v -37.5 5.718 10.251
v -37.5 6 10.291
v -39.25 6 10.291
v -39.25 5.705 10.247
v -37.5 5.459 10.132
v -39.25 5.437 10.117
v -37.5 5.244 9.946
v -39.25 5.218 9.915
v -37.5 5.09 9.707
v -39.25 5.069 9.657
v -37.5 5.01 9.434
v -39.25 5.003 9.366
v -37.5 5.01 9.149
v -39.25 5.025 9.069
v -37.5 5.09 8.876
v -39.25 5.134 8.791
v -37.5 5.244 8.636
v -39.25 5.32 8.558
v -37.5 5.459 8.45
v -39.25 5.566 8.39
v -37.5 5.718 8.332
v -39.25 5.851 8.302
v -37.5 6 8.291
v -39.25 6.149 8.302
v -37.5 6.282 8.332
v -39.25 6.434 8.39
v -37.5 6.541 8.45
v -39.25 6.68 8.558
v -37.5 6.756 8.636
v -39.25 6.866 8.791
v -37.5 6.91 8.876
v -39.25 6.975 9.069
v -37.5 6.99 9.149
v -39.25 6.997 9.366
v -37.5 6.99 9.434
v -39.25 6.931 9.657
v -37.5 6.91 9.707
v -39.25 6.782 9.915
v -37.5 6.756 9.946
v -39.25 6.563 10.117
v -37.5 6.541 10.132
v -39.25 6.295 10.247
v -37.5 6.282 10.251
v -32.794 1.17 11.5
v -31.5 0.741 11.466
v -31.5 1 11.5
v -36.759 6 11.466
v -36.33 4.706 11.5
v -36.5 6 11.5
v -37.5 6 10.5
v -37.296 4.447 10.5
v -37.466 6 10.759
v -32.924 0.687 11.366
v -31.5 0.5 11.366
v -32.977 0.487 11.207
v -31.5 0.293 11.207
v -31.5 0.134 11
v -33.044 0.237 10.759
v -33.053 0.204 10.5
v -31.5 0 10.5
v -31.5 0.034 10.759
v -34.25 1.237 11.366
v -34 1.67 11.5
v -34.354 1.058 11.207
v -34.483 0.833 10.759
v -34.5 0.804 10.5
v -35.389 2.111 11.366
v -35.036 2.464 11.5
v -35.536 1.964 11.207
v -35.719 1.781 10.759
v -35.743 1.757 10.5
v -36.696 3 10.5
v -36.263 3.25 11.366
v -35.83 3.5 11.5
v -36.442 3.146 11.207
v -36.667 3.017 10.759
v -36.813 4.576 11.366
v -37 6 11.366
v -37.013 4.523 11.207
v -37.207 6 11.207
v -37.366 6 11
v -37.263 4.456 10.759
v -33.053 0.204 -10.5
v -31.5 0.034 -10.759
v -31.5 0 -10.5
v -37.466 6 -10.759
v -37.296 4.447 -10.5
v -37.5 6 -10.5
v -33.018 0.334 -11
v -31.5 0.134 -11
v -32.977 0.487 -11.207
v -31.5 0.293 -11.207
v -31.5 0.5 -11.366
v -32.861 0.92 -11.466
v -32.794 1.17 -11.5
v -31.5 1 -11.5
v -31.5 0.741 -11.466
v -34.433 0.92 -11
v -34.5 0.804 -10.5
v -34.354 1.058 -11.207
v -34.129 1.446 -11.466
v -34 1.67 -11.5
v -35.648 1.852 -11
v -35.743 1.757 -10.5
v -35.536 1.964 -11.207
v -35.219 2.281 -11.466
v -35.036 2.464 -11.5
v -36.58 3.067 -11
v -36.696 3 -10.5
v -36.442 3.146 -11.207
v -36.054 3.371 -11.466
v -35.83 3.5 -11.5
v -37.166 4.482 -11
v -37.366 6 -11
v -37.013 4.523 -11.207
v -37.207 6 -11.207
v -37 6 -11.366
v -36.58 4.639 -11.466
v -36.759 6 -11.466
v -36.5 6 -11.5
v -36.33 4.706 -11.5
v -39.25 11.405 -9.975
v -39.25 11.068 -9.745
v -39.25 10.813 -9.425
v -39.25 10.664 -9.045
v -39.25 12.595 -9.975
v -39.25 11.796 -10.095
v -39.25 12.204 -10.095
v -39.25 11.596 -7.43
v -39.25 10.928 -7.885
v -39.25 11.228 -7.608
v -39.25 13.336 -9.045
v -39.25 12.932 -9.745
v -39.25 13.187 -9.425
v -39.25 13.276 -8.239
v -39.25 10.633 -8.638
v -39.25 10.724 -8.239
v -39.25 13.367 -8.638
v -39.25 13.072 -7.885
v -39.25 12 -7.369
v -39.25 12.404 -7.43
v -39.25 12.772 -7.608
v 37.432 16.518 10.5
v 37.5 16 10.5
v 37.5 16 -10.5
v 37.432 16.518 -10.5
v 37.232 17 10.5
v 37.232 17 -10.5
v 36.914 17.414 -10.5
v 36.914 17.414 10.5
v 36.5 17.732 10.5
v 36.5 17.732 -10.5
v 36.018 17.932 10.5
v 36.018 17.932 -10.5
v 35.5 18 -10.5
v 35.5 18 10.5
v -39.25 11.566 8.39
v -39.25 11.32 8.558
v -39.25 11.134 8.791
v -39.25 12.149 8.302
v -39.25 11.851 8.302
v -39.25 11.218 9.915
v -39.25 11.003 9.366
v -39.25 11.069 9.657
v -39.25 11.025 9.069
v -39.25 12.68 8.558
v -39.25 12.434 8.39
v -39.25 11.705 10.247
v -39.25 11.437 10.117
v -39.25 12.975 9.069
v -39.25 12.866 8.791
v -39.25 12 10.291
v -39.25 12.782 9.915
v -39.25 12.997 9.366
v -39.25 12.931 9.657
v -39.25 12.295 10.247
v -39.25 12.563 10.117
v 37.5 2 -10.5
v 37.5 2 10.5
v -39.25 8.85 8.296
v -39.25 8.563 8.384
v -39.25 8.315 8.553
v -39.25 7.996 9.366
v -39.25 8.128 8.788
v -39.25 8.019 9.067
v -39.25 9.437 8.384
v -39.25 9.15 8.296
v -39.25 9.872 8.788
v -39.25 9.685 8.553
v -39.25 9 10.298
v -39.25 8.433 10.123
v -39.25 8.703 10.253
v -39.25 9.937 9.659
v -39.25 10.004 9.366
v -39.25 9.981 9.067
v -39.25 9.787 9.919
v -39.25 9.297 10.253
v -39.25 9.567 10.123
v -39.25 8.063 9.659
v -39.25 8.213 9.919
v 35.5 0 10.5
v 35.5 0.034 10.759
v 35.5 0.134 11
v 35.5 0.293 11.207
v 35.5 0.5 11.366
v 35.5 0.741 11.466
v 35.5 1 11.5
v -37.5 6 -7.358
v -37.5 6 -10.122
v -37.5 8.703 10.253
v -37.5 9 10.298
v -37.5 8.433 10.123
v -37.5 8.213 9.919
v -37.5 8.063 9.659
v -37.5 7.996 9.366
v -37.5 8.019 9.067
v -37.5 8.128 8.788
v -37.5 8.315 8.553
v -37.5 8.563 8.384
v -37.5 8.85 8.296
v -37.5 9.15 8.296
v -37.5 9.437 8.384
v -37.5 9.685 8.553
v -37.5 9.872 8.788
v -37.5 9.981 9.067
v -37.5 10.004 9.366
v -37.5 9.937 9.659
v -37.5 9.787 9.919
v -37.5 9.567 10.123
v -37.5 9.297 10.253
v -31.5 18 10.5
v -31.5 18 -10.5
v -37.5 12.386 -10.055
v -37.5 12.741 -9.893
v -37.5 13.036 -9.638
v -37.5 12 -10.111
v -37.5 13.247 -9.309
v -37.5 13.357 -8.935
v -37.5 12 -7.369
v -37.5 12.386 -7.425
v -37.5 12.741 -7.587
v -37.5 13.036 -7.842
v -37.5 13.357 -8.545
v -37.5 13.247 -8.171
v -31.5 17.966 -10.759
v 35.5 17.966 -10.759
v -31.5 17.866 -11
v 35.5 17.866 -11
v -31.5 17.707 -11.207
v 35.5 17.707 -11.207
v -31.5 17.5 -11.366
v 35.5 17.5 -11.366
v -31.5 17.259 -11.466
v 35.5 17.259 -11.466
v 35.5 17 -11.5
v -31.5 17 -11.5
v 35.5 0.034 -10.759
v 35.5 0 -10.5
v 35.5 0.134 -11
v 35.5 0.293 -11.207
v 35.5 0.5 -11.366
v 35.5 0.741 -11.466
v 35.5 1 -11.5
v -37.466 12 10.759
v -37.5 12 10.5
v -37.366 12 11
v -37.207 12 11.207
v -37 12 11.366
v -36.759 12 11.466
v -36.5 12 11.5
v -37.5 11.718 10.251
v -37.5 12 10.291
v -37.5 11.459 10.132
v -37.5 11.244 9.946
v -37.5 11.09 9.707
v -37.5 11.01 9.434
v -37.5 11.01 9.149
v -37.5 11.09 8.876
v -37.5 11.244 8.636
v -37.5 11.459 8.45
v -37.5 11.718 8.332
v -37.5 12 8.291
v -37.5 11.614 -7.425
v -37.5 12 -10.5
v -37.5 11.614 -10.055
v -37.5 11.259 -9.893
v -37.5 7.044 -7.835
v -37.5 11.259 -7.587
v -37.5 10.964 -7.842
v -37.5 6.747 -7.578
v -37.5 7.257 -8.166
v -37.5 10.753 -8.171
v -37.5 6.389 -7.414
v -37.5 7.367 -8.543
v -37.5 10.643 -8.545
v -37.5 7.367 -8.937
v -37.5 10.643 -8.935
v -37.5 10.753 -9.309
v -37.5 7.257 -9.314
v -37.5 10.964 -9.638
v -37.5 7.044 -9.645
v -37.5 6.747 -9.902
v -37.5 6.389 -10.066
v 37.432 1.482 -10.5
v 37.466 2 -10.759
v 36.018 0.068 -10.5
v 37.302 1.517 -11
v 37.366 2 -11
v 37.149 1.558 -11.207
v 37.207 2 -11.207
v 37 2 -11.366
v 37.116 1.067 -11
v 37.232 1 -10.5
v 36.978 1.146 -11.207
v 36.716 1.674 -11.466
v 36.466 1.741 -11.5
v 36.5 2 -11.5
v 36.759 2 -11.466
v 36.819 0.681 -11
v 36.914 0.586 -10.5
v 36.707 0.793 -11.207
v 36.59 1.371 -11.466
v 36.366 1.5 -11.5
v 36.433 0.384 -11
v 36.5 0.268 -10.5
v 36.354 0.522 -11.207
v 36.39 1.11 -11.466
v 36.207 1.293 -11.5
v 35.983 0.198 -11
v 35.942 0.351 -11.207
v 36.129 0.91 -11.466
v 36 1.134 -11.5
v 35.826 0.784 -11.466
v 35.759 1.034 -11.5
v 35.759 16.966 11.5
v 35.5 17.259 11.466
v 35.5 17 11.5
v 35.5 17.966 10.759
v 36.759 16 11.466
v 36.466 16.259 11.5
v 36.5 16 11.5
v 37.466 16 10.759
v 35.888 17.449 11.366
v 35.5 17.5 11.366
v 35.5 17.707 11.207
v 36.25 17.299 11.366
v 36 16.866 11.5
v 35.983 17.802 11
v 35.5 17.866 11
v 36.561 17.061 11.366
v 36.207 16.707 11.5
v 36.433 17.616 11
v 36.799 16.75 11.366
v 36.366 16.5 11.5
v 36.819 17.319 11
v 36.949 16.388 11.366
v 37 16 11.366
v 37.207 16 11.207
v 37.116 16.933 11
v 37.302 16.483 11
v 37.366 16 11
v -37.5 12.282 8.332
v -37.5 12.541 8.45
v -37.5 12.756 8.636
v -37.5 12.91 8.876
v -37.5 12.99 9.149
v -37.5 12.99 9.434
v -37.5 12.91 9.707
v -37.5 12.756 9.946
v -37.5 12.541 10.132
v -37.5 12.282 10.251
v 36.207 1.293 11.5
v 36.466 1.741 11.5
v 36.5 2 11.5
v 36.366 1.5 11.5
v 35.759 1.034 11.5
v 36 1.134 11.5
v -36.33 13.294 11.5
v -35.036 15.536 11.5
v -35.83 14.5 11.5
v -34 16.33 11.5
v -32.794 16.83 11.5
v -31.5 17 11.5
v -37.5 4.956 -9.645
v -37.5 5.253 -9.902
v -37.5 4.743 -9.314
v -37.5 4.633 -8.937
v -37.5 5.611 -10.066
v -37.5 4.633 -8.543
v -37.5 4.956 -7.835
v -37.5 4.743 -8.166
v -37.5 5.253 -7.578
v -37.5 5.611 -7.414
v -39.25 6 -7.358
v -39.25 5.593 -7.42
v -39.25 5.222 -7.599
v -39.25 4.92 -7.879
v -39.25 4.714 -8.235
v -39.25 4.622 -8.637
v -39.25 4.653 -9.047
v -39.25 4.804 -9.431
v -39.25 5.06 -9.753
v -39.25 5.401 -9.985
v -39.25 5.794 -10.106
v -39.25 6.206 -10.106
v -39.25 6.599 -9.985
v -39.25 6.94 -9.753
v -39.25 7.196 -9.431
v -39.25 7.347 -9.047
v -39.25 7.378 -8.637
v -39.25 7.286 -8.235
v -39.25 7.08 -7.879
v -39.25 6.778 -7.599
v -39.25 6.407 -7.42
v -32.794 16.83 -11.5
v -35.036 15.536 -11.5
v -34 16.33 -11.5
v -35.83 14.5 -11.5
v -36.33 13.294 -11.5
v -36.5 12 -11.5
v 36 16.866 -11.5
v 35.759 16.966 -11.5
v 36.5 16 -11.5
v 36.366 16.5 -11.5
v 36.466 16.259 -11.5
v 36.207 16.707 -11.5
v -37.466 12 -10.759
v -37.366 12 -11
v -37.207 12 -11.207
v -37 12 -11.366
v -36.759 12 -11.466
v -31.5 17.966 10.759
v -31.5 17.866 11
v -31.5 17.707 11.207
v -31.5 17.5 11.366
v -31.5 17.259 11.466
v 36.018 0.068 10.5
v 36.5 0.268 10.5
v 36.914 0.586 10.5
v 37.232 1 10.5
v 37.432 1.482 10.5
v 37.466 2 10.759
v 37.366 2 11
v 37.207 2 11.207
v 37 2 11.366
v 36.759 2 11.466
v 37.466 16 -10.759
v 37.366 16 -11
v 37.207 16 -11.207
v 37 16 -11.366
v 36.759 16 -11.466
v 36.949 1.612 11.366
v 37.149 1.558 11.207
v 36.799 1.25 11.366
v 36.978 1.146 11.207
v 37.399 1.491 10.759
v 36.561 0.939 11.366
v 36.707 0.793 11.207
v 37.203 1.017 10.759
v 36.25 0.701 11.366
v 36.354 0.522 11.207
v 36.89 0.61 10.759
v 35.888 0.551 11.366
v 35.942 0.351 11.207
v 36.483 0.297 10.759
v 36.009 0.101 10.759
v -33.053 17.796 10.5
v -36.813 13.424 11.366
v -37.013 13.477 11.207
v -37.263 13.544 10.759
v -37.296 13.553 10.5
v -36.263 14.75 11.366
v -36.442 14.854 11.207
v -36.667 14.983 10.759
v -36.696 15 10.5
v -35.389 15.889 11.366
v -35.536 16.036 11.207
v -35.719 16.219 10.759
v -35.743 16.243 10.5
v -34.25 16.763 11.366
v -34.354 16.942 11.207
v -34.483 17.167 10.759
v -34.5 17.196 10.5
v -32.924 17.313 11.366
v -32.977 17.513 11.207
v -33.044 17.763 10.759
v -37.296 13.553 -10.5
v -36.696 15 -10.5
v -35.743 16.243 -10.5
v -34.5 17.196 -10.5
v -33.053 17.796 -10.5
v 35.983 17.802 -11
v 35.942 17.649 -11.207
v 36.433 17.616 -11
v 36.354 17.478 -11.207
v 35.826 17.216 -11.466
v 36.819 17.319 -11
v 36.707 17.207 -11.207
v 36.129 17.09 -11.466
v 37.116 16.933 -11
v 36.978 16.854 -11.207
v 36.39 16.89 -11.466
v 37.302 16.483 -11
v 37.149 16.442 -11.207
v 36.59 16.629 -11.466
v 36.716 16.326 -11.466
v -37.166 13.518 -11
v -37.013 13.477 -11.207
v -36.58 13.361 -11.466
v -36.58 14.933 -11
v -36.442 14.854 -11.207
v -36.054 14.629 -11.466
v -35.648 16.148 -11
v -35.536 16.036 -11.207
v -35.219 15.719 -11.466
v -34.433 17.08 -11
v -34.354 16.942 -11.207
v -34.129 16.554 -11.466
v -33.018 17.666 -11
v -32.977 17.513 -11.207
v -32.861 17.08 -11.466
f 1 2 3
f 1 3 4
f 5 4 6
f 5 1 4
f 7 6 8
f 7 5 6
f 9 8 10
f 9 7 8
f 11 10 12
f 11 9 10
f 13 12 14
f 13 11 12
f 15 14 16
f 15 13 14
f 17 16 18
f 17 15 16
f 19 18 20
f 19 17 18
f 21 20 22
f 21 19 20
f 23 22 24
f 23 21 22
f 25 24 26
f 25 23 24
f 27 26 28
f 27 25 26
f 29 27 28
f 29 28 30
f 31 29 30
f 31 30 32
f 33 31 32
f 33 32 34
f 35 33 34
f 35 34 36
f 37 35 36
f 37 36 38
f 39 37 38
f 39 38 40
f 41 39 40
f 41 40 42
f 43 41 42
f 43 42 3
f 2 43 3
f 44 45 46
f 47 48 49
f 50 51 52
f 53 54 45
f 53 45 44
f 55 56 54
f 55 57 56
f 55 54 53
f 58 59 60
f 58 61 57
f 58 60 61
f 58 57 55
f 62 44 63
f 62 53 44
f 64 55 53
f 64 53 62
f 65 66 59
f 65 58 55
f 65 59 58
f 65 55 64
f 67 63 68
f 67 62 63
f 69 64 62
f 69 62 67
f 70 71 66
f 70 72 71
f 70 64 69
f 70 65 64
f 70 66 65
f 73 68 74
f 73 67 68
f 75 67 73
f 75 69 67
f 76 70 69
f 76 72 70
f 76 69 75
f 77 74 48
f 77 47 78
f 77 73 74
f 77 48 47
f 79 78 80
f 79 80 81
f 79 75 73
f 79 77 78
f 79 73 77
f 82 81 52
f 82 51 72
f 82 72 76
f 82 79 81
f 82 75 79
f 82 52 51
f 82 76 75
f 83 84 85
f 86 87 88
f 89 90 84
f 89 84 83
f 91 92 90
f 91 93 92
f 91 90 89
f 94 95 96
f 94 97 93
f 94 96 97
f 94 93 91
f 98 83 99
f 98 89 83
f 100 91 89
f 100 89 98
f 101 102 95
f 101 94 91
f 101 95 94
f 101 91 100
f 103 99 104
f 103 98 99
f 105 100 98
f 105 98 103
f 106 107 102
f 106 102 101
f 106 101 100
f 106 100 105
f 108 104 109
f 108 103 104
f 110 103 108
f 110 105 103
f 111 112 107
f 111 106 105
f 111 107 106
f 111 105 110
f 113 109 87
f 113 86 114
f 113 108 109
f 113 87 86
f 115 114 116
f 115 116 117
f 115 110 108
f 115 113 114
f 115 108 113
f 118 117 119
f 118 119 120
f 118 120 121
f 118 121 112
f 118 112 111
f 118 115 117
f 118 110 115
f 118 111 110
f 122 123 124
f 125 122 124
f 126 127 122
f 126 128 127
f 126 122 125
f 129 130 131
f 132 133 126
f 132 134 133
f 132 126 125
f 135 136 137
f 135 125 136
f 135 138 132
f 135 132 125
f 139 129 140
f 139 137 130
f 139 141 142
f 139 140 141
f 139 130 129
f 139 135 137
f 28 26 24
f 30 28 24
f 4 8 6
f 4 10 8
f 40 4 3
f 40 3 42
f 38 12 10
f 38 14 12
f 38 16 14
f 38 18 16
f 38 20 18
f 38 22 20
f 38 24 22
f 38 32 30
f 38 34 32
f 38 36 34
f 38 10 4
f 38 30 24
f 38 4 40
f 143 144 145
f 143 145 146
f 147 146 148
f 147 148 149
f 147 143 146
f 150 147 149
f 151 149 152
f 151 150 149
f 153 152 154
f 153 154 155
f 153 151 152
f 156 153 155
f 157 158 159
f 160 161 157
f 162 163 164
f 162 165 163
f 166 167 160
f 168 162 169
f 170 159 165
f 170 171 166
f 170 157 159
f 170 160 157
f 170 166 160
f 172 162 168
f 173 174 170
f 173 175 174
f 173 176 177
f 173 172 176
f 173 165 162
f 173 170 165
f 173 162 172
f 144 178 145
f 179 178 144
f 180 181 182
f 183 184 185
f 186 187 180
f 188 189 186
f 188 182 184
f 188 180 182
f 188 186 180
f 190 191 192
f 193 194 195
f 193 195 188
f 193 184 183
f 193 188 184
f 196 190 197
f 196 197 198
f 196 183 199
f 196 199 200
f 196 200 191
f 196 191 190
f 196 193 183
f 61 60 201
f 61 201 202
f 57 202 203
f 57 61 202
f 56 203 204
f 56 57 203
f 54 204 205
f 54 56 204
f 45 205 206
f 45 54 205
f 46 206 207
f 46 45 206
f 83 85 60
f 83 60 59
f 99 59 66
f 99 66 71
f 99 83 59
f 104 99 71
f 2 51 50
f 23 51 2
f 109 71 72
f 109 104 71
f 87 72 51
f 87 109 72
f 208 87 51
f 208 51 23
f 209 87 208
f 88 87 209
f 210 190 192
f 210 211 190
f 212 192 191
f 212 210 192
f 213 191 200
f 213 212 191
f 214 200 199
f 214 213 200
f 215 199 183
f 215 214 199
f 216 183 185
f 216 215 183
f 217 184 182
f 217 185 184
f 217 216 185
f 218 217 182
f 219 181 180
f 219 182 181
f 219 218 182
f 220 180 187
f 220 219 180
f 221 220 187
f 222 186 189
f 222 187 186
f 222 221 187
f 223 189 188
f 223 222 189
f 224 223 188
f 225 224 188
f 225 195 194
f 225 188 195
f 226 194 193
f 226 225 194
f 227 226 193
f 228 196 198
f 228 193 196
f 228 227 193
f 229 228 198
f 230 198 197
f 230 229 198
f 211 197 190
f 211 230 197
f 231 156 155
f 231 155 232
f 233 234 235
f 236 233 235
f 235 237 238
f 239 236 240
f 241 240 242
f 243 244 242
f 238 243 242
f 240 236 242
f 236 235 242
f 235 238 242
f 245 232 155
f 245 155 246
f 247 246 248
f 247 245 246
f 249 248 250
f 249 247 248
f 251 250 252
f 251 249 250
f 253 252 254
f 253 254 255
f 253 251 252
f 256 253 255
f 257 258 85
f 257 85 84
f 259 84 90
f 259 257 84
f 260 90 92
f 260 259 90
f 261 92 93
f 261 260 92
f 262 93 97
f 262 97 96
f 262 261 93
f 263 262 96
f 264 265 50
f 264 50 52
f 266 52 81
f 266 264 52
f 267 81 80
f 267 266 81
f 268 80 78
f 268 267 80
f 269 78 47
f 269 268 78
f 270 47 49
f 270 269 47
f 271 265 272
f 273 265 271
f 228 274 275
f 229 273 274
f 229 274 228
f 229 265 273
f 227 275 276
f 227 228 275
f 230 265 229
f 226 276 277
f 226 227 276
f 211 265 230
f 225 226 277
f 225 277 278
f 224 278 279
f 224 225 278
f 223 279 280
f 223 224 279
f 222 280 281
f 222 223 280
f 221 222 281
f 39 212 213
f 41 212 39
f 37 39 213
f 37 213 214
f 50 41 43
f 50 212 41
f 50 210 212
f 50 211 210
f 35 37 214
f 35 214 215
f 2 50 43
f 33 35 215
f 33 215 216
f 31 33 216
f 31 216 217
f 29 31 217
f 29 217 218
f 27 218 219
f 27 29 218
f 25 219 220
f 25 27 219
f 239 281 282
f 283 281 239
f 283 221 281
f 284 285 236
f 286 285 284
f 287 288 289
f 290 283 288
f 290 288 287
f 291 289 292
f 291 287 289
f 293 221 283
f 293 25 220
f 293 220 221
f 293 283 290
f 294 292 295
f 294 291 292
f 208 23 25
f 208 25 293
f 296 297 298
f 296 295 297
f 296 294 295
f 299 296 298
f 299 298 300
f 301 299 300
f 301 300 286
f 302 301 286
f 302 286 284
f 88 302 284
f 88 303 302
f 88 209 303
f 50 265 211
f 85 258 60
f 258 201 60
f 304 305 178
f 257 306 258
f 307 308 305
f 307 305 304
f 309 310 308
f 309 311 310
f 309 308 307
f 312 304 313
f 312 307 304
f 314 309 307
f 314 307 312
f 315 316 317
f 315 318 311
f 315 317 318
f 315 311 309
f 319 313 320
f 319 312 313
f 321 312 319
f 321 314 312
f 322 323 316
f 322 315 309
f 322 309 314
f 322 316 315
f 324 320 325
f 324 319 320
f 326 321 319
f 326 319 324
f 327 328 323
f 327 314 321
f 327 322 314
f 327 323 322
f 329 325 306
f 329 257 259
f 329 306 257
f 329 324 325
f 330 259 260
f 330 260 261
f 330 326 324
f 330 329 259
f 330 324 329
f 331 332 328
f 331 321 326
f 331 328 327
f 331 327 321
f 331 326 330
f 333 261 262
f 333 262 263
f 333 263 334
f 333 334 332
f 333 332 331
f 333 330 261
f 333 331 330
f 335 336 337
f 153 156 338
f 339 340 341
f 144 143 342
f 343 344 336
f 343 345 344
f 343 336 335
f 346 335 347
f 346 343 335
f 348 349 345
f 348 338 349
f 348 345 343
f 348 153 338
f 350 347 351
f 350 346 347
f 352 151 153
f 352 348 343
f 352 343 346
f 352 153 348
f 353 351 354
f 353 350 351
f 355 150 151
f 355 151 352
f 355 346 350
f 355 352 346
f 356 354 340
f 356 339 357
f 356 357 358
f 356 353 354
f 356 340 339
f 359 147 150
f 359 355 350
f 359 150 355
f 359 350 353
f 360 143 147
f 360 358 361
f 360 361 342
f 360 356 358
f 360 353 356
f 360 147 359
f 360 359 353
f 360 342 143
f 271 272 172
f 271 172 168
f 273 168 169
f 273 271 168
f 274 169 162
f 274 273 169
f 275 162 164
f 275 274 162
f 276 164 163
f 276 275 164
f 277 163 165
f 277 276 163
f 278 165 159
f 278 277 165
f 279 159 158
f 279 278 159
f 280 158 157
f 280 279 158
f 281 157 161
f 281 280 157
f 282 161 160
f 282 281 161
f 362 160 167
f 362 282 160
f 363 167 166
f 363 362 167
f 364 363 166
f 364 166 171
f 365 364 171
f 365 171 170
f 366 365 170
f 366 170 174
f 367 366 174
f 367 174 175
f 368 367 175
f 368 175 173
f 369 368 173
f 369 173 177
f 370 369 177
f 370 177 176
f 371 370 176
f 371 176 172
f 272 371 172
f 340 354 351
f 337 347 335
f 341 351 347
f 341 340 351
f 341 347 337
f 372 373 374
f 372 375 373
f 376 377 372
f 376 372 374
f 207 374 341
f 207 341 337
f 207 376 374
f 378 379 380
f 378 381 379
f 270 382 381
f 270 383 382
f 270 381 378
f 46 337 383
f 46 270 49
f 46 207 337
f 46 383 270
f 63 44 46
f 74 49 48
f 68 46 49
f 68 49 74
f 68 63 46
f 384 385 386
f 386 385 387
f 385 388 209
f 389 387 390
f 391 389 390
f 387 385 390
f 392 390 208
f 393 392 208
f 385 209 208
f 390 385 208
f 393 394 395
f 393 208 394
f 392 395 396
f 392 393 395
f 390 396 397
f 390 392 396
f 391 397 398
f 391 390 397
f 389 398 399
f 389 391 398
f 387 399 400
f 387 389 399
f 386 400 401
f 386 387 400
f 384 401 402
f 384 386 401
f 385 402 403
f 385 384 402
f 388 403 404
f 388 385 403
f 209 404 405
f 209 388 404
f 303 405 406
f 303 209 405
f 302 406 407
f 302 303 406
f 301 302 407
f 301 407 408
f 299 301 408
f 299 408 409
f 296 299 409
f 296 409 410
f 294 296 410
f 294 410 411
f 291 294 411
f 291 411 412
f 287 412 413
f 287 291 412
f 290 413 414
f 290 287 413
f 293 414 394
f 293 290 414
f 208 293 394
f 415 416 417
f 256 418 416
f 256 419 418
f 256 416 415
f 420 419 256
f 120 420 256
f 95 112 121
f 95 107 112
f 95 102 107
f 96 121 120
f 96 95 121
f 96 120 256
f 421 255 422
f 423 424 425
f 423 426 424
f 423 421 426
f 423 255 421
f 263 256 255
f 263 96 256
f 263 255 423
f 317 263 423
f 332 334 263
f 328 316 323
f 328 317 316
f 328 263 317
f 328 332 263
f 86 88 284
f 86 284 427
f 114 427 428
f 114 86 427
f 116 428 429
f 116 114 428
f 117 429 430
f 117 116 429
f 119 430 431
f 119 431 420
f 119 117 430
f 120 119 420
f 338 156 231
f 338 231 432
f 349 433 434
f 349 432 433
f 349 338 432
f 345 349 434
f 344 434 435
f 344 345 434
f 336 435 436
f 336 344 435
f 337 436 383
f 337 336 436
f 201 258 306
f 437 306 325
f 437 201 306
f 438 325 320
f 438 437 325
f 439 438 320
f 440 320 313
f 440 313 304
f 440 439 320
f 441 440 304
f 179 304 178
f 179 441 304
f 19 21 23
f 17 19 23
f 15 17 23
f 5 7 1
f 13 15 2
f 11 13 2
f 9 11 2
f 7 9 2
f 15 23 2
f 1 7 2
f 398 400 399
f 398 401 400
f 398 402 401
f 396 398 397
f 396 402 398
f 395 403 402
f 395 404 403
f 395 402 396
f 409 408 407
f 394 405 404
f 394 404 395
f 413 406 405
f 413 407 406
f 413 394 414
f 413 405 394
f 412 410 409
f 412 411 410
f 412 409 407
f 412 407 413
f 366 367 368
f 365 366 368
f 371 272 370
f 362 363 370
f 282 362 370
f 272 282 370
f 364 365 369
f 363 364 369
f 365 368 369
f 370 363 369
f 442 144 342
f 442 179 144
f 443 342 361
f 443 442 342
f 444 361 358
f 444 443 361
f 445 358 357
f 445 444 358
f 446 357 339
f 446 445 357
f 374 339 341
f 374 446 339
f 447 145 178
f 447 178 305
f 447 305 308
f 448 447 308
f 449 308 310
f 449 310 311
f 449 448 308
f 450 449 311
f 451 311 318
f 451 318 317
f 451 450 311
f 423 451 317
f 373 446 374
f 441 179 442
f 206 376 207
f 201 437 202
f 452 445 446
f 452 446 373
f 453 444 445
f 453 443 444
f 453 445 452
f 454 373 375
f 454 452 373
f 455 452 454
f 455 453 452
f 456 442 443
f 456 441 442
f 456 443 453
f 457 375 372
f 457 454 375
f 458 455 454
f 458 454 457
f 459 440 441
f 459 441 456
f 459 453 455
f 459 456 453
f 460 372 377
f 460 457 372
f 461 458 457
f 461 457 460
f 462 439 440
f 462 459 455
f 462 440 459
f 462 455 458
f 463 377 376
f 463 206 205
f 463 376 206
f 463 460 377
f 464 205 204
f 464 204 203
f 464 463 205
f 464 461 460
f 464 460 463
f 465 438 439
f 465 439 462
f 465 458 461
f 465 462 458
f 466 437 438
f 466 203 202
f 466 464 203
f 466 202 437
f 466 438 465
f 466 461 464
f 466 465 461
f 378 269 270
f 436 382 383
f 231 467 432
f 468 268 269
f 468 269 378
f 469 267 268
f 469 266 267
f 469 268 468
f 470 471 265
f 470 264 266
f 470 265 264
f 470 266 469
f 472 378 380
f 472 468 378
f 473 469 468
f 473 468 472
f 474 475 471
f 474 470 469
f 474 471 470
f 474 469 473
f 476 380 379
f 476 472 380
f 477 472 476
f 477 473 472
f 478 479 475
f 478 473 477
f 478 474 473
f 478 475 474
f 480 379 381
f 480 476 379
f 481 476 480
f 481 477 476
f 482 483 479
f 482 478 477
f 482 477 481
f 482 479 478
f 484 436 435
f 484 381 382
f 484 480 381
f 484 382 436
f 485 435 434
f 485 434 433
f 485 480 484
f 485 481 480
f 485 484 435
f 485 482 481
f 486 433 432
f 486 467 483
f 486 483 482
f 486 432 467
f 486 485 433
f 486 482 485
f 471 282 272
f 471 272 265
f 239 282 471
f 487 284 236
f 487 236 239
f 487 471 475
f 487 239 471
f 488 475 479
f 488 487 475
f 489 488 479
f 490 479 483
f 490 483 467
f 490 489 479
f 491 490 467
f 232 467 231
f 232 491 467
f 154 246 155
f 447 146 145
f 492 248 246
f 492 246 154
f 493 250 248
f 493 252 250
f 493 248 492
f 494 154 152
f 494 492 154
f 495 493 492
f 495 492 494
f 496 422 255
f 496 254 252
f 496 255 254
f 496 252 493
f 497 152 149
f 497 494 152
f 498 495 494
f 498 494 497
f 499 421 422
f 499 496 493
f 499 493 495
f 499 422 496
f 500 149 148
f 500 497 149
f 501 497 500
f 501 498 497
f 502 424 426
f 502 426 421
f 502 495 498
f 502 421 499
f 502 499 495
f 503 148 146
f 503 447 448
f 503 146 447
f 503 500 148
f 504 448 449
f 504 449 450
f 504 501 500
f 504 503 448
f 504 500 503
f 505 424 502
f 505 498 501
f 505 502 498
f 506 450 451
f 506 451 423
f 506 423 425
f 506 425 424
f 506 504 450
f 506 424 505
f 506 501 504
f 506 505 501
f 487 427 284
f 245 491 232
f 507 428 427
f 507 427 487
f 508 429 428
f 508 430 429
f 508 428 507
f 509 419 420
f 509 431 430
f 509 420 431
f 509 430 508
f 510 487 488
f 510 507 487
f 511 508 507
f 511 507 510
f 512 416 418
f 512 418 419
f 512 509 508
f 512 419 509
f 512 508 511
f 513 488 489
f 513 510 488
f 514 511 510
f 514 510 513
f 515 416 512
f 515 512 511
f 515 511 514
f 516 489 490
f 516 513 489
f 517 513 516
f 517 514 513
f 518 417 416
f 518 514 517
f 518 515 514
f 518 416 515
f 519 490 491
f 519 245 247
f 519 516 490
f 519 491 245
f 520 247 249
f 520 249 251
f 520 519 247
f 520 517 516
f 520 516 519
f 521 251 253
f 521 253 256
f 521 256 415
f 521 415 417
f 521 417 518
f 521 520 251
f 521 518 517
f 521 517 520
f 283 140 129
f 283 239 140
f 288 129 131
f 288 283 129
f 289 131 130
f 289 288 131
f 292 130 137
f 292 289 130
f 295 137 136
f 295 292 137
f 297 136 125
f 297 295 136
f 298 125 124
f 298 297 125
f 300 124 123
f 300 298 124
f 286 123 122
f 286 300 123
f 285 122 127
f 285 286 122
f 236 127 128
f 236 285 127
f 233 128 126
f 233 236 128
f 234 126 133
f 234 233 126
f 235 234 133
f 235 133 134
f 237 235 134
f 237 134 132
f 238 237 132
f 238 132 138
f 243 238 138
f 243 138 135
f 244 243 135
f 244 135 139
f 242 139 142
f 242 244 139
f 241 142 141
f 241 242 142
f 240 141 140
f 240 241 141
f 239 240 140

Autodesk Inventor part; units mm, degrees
ref_plane "YZ Plane" through (0, 0, 0) normal (1, 0, 0) x (0, 1, 0)
ref_plane "XZ Plane" through (0, 0, 0) normal (0, 1, 0) x (-1, 0, 0)
sketch "Esboço1" plane through (0, 0, 0) normal (0, 1, 0) x (-1, 0, 0)
  line L0 (-37.5, 11.5) -> (37.5, 11.5)
  line L1 (37.5, 11.5) -> (37.5, -11.5)
  line L2 (37.5, -11.5) -> (-37.5, -11.5)
  line L3 (-37.5, -11.5) -> (-37.5, 11.5)
  line L4 (-37.5, 11.5) -> (37.5, -11.5) construction
  line L5 (37.5, 11.5) -> (-37.5, -11.5) construction
  point P0 (0, 0)
  dimension "d0" = 75
  dimension "d1" = 23
extrude "Extrusão1" add sketch "Esboço1" along normal blind 18
fillet "Arredondamento1" radius 6 2 edges at (-37.5, 18, 0) (-37.5, 0, 0)
ref_plane "Plano de trabalho1" through (-37.5, 6, 11.5) normal (-1, 0, 0) x (0, 0, 1)
sketch "Esboço2" plane through (-37.5, 6, 11.5) normal (-1, 0, 0) x (0, 0, 1)
  line L0 (-23, -6) -> (-23, 12) projected
  line L1 (-23, 3) -> (-17.6681, 8.7956) construction
  line L2 (-19.3047, -1.0167) -> (-21.1754, 1.0167) construction
  line L3 (-23, -2.7956) -> (-23, 8.7956)
  line L4 (0, 0) -> (-23, 0) projected
  circle A0 centre (-20.24, 0) radius 1.3815
  line L5 (-23, 6) -> (0, 6) projected
  circle A1 centre (-20.24, 6) radius 1.3706
  circle A2 centre (-2.2088, 3) radius 1.0065
  circle A3 centre (-2.2088, 6) radius 1
  circle A4 centre (-2.2088, 0) radius 1
  point P0 (-11.5, -6)
  dimension "d6" = 2
  dimension "d7" = 2
extrude "Extrusão2" add sketch "Esboço2" along normal blind 1.75
fillet "Arredondamento2" radius 2 2 edges at (37.5, 18, 0) (37.5, 0, 0)
fillet "Arredondamento3" radius 1 16 edges at (36.9142, 17.4142, 11.5) (37.5, 9, 11.5) (36.9142, 0.5858, 11.5) (2, 0, 11.5) (-35.7426, 1.7574, 11.5) (-37.5, 9, 11.5) (-35.7426, 16.2426, 11.5) (2, 18, 11.5) (-35.7426, 1.7574, -11.5) (-37.5, 9, -11.5) (-35.7426, 16.2426, -11.5) (2, 18, -11.5) (36.9142, 17.4142, -11.5) (37.5, 9, -11.5) (36.9142, 0.5858, -11.5) (2, 0, -11.5)
sketch "Esboço3" plane through (0, 18, 0) normal (0, 1, 0) x (1, 0, 0)
  line L0 (-29.9595, -10.4813) -> (30.9762, -10.4813) construction
  line L1 (-6.9418, 2.4664) -> (12.8628, 2.4664) construction
  line L2 (12.8628, 2.4664) -> (12.8628, -1.4881) construction
  line L3 (12.8628, -1.4881) -> (-6.9418, -1.4881) construction
  line L4 (-6.9418, -1.4881) -> (-6.9418, 2.4664) construction
  point P0 (0, 0)
properties part number "bateria"
